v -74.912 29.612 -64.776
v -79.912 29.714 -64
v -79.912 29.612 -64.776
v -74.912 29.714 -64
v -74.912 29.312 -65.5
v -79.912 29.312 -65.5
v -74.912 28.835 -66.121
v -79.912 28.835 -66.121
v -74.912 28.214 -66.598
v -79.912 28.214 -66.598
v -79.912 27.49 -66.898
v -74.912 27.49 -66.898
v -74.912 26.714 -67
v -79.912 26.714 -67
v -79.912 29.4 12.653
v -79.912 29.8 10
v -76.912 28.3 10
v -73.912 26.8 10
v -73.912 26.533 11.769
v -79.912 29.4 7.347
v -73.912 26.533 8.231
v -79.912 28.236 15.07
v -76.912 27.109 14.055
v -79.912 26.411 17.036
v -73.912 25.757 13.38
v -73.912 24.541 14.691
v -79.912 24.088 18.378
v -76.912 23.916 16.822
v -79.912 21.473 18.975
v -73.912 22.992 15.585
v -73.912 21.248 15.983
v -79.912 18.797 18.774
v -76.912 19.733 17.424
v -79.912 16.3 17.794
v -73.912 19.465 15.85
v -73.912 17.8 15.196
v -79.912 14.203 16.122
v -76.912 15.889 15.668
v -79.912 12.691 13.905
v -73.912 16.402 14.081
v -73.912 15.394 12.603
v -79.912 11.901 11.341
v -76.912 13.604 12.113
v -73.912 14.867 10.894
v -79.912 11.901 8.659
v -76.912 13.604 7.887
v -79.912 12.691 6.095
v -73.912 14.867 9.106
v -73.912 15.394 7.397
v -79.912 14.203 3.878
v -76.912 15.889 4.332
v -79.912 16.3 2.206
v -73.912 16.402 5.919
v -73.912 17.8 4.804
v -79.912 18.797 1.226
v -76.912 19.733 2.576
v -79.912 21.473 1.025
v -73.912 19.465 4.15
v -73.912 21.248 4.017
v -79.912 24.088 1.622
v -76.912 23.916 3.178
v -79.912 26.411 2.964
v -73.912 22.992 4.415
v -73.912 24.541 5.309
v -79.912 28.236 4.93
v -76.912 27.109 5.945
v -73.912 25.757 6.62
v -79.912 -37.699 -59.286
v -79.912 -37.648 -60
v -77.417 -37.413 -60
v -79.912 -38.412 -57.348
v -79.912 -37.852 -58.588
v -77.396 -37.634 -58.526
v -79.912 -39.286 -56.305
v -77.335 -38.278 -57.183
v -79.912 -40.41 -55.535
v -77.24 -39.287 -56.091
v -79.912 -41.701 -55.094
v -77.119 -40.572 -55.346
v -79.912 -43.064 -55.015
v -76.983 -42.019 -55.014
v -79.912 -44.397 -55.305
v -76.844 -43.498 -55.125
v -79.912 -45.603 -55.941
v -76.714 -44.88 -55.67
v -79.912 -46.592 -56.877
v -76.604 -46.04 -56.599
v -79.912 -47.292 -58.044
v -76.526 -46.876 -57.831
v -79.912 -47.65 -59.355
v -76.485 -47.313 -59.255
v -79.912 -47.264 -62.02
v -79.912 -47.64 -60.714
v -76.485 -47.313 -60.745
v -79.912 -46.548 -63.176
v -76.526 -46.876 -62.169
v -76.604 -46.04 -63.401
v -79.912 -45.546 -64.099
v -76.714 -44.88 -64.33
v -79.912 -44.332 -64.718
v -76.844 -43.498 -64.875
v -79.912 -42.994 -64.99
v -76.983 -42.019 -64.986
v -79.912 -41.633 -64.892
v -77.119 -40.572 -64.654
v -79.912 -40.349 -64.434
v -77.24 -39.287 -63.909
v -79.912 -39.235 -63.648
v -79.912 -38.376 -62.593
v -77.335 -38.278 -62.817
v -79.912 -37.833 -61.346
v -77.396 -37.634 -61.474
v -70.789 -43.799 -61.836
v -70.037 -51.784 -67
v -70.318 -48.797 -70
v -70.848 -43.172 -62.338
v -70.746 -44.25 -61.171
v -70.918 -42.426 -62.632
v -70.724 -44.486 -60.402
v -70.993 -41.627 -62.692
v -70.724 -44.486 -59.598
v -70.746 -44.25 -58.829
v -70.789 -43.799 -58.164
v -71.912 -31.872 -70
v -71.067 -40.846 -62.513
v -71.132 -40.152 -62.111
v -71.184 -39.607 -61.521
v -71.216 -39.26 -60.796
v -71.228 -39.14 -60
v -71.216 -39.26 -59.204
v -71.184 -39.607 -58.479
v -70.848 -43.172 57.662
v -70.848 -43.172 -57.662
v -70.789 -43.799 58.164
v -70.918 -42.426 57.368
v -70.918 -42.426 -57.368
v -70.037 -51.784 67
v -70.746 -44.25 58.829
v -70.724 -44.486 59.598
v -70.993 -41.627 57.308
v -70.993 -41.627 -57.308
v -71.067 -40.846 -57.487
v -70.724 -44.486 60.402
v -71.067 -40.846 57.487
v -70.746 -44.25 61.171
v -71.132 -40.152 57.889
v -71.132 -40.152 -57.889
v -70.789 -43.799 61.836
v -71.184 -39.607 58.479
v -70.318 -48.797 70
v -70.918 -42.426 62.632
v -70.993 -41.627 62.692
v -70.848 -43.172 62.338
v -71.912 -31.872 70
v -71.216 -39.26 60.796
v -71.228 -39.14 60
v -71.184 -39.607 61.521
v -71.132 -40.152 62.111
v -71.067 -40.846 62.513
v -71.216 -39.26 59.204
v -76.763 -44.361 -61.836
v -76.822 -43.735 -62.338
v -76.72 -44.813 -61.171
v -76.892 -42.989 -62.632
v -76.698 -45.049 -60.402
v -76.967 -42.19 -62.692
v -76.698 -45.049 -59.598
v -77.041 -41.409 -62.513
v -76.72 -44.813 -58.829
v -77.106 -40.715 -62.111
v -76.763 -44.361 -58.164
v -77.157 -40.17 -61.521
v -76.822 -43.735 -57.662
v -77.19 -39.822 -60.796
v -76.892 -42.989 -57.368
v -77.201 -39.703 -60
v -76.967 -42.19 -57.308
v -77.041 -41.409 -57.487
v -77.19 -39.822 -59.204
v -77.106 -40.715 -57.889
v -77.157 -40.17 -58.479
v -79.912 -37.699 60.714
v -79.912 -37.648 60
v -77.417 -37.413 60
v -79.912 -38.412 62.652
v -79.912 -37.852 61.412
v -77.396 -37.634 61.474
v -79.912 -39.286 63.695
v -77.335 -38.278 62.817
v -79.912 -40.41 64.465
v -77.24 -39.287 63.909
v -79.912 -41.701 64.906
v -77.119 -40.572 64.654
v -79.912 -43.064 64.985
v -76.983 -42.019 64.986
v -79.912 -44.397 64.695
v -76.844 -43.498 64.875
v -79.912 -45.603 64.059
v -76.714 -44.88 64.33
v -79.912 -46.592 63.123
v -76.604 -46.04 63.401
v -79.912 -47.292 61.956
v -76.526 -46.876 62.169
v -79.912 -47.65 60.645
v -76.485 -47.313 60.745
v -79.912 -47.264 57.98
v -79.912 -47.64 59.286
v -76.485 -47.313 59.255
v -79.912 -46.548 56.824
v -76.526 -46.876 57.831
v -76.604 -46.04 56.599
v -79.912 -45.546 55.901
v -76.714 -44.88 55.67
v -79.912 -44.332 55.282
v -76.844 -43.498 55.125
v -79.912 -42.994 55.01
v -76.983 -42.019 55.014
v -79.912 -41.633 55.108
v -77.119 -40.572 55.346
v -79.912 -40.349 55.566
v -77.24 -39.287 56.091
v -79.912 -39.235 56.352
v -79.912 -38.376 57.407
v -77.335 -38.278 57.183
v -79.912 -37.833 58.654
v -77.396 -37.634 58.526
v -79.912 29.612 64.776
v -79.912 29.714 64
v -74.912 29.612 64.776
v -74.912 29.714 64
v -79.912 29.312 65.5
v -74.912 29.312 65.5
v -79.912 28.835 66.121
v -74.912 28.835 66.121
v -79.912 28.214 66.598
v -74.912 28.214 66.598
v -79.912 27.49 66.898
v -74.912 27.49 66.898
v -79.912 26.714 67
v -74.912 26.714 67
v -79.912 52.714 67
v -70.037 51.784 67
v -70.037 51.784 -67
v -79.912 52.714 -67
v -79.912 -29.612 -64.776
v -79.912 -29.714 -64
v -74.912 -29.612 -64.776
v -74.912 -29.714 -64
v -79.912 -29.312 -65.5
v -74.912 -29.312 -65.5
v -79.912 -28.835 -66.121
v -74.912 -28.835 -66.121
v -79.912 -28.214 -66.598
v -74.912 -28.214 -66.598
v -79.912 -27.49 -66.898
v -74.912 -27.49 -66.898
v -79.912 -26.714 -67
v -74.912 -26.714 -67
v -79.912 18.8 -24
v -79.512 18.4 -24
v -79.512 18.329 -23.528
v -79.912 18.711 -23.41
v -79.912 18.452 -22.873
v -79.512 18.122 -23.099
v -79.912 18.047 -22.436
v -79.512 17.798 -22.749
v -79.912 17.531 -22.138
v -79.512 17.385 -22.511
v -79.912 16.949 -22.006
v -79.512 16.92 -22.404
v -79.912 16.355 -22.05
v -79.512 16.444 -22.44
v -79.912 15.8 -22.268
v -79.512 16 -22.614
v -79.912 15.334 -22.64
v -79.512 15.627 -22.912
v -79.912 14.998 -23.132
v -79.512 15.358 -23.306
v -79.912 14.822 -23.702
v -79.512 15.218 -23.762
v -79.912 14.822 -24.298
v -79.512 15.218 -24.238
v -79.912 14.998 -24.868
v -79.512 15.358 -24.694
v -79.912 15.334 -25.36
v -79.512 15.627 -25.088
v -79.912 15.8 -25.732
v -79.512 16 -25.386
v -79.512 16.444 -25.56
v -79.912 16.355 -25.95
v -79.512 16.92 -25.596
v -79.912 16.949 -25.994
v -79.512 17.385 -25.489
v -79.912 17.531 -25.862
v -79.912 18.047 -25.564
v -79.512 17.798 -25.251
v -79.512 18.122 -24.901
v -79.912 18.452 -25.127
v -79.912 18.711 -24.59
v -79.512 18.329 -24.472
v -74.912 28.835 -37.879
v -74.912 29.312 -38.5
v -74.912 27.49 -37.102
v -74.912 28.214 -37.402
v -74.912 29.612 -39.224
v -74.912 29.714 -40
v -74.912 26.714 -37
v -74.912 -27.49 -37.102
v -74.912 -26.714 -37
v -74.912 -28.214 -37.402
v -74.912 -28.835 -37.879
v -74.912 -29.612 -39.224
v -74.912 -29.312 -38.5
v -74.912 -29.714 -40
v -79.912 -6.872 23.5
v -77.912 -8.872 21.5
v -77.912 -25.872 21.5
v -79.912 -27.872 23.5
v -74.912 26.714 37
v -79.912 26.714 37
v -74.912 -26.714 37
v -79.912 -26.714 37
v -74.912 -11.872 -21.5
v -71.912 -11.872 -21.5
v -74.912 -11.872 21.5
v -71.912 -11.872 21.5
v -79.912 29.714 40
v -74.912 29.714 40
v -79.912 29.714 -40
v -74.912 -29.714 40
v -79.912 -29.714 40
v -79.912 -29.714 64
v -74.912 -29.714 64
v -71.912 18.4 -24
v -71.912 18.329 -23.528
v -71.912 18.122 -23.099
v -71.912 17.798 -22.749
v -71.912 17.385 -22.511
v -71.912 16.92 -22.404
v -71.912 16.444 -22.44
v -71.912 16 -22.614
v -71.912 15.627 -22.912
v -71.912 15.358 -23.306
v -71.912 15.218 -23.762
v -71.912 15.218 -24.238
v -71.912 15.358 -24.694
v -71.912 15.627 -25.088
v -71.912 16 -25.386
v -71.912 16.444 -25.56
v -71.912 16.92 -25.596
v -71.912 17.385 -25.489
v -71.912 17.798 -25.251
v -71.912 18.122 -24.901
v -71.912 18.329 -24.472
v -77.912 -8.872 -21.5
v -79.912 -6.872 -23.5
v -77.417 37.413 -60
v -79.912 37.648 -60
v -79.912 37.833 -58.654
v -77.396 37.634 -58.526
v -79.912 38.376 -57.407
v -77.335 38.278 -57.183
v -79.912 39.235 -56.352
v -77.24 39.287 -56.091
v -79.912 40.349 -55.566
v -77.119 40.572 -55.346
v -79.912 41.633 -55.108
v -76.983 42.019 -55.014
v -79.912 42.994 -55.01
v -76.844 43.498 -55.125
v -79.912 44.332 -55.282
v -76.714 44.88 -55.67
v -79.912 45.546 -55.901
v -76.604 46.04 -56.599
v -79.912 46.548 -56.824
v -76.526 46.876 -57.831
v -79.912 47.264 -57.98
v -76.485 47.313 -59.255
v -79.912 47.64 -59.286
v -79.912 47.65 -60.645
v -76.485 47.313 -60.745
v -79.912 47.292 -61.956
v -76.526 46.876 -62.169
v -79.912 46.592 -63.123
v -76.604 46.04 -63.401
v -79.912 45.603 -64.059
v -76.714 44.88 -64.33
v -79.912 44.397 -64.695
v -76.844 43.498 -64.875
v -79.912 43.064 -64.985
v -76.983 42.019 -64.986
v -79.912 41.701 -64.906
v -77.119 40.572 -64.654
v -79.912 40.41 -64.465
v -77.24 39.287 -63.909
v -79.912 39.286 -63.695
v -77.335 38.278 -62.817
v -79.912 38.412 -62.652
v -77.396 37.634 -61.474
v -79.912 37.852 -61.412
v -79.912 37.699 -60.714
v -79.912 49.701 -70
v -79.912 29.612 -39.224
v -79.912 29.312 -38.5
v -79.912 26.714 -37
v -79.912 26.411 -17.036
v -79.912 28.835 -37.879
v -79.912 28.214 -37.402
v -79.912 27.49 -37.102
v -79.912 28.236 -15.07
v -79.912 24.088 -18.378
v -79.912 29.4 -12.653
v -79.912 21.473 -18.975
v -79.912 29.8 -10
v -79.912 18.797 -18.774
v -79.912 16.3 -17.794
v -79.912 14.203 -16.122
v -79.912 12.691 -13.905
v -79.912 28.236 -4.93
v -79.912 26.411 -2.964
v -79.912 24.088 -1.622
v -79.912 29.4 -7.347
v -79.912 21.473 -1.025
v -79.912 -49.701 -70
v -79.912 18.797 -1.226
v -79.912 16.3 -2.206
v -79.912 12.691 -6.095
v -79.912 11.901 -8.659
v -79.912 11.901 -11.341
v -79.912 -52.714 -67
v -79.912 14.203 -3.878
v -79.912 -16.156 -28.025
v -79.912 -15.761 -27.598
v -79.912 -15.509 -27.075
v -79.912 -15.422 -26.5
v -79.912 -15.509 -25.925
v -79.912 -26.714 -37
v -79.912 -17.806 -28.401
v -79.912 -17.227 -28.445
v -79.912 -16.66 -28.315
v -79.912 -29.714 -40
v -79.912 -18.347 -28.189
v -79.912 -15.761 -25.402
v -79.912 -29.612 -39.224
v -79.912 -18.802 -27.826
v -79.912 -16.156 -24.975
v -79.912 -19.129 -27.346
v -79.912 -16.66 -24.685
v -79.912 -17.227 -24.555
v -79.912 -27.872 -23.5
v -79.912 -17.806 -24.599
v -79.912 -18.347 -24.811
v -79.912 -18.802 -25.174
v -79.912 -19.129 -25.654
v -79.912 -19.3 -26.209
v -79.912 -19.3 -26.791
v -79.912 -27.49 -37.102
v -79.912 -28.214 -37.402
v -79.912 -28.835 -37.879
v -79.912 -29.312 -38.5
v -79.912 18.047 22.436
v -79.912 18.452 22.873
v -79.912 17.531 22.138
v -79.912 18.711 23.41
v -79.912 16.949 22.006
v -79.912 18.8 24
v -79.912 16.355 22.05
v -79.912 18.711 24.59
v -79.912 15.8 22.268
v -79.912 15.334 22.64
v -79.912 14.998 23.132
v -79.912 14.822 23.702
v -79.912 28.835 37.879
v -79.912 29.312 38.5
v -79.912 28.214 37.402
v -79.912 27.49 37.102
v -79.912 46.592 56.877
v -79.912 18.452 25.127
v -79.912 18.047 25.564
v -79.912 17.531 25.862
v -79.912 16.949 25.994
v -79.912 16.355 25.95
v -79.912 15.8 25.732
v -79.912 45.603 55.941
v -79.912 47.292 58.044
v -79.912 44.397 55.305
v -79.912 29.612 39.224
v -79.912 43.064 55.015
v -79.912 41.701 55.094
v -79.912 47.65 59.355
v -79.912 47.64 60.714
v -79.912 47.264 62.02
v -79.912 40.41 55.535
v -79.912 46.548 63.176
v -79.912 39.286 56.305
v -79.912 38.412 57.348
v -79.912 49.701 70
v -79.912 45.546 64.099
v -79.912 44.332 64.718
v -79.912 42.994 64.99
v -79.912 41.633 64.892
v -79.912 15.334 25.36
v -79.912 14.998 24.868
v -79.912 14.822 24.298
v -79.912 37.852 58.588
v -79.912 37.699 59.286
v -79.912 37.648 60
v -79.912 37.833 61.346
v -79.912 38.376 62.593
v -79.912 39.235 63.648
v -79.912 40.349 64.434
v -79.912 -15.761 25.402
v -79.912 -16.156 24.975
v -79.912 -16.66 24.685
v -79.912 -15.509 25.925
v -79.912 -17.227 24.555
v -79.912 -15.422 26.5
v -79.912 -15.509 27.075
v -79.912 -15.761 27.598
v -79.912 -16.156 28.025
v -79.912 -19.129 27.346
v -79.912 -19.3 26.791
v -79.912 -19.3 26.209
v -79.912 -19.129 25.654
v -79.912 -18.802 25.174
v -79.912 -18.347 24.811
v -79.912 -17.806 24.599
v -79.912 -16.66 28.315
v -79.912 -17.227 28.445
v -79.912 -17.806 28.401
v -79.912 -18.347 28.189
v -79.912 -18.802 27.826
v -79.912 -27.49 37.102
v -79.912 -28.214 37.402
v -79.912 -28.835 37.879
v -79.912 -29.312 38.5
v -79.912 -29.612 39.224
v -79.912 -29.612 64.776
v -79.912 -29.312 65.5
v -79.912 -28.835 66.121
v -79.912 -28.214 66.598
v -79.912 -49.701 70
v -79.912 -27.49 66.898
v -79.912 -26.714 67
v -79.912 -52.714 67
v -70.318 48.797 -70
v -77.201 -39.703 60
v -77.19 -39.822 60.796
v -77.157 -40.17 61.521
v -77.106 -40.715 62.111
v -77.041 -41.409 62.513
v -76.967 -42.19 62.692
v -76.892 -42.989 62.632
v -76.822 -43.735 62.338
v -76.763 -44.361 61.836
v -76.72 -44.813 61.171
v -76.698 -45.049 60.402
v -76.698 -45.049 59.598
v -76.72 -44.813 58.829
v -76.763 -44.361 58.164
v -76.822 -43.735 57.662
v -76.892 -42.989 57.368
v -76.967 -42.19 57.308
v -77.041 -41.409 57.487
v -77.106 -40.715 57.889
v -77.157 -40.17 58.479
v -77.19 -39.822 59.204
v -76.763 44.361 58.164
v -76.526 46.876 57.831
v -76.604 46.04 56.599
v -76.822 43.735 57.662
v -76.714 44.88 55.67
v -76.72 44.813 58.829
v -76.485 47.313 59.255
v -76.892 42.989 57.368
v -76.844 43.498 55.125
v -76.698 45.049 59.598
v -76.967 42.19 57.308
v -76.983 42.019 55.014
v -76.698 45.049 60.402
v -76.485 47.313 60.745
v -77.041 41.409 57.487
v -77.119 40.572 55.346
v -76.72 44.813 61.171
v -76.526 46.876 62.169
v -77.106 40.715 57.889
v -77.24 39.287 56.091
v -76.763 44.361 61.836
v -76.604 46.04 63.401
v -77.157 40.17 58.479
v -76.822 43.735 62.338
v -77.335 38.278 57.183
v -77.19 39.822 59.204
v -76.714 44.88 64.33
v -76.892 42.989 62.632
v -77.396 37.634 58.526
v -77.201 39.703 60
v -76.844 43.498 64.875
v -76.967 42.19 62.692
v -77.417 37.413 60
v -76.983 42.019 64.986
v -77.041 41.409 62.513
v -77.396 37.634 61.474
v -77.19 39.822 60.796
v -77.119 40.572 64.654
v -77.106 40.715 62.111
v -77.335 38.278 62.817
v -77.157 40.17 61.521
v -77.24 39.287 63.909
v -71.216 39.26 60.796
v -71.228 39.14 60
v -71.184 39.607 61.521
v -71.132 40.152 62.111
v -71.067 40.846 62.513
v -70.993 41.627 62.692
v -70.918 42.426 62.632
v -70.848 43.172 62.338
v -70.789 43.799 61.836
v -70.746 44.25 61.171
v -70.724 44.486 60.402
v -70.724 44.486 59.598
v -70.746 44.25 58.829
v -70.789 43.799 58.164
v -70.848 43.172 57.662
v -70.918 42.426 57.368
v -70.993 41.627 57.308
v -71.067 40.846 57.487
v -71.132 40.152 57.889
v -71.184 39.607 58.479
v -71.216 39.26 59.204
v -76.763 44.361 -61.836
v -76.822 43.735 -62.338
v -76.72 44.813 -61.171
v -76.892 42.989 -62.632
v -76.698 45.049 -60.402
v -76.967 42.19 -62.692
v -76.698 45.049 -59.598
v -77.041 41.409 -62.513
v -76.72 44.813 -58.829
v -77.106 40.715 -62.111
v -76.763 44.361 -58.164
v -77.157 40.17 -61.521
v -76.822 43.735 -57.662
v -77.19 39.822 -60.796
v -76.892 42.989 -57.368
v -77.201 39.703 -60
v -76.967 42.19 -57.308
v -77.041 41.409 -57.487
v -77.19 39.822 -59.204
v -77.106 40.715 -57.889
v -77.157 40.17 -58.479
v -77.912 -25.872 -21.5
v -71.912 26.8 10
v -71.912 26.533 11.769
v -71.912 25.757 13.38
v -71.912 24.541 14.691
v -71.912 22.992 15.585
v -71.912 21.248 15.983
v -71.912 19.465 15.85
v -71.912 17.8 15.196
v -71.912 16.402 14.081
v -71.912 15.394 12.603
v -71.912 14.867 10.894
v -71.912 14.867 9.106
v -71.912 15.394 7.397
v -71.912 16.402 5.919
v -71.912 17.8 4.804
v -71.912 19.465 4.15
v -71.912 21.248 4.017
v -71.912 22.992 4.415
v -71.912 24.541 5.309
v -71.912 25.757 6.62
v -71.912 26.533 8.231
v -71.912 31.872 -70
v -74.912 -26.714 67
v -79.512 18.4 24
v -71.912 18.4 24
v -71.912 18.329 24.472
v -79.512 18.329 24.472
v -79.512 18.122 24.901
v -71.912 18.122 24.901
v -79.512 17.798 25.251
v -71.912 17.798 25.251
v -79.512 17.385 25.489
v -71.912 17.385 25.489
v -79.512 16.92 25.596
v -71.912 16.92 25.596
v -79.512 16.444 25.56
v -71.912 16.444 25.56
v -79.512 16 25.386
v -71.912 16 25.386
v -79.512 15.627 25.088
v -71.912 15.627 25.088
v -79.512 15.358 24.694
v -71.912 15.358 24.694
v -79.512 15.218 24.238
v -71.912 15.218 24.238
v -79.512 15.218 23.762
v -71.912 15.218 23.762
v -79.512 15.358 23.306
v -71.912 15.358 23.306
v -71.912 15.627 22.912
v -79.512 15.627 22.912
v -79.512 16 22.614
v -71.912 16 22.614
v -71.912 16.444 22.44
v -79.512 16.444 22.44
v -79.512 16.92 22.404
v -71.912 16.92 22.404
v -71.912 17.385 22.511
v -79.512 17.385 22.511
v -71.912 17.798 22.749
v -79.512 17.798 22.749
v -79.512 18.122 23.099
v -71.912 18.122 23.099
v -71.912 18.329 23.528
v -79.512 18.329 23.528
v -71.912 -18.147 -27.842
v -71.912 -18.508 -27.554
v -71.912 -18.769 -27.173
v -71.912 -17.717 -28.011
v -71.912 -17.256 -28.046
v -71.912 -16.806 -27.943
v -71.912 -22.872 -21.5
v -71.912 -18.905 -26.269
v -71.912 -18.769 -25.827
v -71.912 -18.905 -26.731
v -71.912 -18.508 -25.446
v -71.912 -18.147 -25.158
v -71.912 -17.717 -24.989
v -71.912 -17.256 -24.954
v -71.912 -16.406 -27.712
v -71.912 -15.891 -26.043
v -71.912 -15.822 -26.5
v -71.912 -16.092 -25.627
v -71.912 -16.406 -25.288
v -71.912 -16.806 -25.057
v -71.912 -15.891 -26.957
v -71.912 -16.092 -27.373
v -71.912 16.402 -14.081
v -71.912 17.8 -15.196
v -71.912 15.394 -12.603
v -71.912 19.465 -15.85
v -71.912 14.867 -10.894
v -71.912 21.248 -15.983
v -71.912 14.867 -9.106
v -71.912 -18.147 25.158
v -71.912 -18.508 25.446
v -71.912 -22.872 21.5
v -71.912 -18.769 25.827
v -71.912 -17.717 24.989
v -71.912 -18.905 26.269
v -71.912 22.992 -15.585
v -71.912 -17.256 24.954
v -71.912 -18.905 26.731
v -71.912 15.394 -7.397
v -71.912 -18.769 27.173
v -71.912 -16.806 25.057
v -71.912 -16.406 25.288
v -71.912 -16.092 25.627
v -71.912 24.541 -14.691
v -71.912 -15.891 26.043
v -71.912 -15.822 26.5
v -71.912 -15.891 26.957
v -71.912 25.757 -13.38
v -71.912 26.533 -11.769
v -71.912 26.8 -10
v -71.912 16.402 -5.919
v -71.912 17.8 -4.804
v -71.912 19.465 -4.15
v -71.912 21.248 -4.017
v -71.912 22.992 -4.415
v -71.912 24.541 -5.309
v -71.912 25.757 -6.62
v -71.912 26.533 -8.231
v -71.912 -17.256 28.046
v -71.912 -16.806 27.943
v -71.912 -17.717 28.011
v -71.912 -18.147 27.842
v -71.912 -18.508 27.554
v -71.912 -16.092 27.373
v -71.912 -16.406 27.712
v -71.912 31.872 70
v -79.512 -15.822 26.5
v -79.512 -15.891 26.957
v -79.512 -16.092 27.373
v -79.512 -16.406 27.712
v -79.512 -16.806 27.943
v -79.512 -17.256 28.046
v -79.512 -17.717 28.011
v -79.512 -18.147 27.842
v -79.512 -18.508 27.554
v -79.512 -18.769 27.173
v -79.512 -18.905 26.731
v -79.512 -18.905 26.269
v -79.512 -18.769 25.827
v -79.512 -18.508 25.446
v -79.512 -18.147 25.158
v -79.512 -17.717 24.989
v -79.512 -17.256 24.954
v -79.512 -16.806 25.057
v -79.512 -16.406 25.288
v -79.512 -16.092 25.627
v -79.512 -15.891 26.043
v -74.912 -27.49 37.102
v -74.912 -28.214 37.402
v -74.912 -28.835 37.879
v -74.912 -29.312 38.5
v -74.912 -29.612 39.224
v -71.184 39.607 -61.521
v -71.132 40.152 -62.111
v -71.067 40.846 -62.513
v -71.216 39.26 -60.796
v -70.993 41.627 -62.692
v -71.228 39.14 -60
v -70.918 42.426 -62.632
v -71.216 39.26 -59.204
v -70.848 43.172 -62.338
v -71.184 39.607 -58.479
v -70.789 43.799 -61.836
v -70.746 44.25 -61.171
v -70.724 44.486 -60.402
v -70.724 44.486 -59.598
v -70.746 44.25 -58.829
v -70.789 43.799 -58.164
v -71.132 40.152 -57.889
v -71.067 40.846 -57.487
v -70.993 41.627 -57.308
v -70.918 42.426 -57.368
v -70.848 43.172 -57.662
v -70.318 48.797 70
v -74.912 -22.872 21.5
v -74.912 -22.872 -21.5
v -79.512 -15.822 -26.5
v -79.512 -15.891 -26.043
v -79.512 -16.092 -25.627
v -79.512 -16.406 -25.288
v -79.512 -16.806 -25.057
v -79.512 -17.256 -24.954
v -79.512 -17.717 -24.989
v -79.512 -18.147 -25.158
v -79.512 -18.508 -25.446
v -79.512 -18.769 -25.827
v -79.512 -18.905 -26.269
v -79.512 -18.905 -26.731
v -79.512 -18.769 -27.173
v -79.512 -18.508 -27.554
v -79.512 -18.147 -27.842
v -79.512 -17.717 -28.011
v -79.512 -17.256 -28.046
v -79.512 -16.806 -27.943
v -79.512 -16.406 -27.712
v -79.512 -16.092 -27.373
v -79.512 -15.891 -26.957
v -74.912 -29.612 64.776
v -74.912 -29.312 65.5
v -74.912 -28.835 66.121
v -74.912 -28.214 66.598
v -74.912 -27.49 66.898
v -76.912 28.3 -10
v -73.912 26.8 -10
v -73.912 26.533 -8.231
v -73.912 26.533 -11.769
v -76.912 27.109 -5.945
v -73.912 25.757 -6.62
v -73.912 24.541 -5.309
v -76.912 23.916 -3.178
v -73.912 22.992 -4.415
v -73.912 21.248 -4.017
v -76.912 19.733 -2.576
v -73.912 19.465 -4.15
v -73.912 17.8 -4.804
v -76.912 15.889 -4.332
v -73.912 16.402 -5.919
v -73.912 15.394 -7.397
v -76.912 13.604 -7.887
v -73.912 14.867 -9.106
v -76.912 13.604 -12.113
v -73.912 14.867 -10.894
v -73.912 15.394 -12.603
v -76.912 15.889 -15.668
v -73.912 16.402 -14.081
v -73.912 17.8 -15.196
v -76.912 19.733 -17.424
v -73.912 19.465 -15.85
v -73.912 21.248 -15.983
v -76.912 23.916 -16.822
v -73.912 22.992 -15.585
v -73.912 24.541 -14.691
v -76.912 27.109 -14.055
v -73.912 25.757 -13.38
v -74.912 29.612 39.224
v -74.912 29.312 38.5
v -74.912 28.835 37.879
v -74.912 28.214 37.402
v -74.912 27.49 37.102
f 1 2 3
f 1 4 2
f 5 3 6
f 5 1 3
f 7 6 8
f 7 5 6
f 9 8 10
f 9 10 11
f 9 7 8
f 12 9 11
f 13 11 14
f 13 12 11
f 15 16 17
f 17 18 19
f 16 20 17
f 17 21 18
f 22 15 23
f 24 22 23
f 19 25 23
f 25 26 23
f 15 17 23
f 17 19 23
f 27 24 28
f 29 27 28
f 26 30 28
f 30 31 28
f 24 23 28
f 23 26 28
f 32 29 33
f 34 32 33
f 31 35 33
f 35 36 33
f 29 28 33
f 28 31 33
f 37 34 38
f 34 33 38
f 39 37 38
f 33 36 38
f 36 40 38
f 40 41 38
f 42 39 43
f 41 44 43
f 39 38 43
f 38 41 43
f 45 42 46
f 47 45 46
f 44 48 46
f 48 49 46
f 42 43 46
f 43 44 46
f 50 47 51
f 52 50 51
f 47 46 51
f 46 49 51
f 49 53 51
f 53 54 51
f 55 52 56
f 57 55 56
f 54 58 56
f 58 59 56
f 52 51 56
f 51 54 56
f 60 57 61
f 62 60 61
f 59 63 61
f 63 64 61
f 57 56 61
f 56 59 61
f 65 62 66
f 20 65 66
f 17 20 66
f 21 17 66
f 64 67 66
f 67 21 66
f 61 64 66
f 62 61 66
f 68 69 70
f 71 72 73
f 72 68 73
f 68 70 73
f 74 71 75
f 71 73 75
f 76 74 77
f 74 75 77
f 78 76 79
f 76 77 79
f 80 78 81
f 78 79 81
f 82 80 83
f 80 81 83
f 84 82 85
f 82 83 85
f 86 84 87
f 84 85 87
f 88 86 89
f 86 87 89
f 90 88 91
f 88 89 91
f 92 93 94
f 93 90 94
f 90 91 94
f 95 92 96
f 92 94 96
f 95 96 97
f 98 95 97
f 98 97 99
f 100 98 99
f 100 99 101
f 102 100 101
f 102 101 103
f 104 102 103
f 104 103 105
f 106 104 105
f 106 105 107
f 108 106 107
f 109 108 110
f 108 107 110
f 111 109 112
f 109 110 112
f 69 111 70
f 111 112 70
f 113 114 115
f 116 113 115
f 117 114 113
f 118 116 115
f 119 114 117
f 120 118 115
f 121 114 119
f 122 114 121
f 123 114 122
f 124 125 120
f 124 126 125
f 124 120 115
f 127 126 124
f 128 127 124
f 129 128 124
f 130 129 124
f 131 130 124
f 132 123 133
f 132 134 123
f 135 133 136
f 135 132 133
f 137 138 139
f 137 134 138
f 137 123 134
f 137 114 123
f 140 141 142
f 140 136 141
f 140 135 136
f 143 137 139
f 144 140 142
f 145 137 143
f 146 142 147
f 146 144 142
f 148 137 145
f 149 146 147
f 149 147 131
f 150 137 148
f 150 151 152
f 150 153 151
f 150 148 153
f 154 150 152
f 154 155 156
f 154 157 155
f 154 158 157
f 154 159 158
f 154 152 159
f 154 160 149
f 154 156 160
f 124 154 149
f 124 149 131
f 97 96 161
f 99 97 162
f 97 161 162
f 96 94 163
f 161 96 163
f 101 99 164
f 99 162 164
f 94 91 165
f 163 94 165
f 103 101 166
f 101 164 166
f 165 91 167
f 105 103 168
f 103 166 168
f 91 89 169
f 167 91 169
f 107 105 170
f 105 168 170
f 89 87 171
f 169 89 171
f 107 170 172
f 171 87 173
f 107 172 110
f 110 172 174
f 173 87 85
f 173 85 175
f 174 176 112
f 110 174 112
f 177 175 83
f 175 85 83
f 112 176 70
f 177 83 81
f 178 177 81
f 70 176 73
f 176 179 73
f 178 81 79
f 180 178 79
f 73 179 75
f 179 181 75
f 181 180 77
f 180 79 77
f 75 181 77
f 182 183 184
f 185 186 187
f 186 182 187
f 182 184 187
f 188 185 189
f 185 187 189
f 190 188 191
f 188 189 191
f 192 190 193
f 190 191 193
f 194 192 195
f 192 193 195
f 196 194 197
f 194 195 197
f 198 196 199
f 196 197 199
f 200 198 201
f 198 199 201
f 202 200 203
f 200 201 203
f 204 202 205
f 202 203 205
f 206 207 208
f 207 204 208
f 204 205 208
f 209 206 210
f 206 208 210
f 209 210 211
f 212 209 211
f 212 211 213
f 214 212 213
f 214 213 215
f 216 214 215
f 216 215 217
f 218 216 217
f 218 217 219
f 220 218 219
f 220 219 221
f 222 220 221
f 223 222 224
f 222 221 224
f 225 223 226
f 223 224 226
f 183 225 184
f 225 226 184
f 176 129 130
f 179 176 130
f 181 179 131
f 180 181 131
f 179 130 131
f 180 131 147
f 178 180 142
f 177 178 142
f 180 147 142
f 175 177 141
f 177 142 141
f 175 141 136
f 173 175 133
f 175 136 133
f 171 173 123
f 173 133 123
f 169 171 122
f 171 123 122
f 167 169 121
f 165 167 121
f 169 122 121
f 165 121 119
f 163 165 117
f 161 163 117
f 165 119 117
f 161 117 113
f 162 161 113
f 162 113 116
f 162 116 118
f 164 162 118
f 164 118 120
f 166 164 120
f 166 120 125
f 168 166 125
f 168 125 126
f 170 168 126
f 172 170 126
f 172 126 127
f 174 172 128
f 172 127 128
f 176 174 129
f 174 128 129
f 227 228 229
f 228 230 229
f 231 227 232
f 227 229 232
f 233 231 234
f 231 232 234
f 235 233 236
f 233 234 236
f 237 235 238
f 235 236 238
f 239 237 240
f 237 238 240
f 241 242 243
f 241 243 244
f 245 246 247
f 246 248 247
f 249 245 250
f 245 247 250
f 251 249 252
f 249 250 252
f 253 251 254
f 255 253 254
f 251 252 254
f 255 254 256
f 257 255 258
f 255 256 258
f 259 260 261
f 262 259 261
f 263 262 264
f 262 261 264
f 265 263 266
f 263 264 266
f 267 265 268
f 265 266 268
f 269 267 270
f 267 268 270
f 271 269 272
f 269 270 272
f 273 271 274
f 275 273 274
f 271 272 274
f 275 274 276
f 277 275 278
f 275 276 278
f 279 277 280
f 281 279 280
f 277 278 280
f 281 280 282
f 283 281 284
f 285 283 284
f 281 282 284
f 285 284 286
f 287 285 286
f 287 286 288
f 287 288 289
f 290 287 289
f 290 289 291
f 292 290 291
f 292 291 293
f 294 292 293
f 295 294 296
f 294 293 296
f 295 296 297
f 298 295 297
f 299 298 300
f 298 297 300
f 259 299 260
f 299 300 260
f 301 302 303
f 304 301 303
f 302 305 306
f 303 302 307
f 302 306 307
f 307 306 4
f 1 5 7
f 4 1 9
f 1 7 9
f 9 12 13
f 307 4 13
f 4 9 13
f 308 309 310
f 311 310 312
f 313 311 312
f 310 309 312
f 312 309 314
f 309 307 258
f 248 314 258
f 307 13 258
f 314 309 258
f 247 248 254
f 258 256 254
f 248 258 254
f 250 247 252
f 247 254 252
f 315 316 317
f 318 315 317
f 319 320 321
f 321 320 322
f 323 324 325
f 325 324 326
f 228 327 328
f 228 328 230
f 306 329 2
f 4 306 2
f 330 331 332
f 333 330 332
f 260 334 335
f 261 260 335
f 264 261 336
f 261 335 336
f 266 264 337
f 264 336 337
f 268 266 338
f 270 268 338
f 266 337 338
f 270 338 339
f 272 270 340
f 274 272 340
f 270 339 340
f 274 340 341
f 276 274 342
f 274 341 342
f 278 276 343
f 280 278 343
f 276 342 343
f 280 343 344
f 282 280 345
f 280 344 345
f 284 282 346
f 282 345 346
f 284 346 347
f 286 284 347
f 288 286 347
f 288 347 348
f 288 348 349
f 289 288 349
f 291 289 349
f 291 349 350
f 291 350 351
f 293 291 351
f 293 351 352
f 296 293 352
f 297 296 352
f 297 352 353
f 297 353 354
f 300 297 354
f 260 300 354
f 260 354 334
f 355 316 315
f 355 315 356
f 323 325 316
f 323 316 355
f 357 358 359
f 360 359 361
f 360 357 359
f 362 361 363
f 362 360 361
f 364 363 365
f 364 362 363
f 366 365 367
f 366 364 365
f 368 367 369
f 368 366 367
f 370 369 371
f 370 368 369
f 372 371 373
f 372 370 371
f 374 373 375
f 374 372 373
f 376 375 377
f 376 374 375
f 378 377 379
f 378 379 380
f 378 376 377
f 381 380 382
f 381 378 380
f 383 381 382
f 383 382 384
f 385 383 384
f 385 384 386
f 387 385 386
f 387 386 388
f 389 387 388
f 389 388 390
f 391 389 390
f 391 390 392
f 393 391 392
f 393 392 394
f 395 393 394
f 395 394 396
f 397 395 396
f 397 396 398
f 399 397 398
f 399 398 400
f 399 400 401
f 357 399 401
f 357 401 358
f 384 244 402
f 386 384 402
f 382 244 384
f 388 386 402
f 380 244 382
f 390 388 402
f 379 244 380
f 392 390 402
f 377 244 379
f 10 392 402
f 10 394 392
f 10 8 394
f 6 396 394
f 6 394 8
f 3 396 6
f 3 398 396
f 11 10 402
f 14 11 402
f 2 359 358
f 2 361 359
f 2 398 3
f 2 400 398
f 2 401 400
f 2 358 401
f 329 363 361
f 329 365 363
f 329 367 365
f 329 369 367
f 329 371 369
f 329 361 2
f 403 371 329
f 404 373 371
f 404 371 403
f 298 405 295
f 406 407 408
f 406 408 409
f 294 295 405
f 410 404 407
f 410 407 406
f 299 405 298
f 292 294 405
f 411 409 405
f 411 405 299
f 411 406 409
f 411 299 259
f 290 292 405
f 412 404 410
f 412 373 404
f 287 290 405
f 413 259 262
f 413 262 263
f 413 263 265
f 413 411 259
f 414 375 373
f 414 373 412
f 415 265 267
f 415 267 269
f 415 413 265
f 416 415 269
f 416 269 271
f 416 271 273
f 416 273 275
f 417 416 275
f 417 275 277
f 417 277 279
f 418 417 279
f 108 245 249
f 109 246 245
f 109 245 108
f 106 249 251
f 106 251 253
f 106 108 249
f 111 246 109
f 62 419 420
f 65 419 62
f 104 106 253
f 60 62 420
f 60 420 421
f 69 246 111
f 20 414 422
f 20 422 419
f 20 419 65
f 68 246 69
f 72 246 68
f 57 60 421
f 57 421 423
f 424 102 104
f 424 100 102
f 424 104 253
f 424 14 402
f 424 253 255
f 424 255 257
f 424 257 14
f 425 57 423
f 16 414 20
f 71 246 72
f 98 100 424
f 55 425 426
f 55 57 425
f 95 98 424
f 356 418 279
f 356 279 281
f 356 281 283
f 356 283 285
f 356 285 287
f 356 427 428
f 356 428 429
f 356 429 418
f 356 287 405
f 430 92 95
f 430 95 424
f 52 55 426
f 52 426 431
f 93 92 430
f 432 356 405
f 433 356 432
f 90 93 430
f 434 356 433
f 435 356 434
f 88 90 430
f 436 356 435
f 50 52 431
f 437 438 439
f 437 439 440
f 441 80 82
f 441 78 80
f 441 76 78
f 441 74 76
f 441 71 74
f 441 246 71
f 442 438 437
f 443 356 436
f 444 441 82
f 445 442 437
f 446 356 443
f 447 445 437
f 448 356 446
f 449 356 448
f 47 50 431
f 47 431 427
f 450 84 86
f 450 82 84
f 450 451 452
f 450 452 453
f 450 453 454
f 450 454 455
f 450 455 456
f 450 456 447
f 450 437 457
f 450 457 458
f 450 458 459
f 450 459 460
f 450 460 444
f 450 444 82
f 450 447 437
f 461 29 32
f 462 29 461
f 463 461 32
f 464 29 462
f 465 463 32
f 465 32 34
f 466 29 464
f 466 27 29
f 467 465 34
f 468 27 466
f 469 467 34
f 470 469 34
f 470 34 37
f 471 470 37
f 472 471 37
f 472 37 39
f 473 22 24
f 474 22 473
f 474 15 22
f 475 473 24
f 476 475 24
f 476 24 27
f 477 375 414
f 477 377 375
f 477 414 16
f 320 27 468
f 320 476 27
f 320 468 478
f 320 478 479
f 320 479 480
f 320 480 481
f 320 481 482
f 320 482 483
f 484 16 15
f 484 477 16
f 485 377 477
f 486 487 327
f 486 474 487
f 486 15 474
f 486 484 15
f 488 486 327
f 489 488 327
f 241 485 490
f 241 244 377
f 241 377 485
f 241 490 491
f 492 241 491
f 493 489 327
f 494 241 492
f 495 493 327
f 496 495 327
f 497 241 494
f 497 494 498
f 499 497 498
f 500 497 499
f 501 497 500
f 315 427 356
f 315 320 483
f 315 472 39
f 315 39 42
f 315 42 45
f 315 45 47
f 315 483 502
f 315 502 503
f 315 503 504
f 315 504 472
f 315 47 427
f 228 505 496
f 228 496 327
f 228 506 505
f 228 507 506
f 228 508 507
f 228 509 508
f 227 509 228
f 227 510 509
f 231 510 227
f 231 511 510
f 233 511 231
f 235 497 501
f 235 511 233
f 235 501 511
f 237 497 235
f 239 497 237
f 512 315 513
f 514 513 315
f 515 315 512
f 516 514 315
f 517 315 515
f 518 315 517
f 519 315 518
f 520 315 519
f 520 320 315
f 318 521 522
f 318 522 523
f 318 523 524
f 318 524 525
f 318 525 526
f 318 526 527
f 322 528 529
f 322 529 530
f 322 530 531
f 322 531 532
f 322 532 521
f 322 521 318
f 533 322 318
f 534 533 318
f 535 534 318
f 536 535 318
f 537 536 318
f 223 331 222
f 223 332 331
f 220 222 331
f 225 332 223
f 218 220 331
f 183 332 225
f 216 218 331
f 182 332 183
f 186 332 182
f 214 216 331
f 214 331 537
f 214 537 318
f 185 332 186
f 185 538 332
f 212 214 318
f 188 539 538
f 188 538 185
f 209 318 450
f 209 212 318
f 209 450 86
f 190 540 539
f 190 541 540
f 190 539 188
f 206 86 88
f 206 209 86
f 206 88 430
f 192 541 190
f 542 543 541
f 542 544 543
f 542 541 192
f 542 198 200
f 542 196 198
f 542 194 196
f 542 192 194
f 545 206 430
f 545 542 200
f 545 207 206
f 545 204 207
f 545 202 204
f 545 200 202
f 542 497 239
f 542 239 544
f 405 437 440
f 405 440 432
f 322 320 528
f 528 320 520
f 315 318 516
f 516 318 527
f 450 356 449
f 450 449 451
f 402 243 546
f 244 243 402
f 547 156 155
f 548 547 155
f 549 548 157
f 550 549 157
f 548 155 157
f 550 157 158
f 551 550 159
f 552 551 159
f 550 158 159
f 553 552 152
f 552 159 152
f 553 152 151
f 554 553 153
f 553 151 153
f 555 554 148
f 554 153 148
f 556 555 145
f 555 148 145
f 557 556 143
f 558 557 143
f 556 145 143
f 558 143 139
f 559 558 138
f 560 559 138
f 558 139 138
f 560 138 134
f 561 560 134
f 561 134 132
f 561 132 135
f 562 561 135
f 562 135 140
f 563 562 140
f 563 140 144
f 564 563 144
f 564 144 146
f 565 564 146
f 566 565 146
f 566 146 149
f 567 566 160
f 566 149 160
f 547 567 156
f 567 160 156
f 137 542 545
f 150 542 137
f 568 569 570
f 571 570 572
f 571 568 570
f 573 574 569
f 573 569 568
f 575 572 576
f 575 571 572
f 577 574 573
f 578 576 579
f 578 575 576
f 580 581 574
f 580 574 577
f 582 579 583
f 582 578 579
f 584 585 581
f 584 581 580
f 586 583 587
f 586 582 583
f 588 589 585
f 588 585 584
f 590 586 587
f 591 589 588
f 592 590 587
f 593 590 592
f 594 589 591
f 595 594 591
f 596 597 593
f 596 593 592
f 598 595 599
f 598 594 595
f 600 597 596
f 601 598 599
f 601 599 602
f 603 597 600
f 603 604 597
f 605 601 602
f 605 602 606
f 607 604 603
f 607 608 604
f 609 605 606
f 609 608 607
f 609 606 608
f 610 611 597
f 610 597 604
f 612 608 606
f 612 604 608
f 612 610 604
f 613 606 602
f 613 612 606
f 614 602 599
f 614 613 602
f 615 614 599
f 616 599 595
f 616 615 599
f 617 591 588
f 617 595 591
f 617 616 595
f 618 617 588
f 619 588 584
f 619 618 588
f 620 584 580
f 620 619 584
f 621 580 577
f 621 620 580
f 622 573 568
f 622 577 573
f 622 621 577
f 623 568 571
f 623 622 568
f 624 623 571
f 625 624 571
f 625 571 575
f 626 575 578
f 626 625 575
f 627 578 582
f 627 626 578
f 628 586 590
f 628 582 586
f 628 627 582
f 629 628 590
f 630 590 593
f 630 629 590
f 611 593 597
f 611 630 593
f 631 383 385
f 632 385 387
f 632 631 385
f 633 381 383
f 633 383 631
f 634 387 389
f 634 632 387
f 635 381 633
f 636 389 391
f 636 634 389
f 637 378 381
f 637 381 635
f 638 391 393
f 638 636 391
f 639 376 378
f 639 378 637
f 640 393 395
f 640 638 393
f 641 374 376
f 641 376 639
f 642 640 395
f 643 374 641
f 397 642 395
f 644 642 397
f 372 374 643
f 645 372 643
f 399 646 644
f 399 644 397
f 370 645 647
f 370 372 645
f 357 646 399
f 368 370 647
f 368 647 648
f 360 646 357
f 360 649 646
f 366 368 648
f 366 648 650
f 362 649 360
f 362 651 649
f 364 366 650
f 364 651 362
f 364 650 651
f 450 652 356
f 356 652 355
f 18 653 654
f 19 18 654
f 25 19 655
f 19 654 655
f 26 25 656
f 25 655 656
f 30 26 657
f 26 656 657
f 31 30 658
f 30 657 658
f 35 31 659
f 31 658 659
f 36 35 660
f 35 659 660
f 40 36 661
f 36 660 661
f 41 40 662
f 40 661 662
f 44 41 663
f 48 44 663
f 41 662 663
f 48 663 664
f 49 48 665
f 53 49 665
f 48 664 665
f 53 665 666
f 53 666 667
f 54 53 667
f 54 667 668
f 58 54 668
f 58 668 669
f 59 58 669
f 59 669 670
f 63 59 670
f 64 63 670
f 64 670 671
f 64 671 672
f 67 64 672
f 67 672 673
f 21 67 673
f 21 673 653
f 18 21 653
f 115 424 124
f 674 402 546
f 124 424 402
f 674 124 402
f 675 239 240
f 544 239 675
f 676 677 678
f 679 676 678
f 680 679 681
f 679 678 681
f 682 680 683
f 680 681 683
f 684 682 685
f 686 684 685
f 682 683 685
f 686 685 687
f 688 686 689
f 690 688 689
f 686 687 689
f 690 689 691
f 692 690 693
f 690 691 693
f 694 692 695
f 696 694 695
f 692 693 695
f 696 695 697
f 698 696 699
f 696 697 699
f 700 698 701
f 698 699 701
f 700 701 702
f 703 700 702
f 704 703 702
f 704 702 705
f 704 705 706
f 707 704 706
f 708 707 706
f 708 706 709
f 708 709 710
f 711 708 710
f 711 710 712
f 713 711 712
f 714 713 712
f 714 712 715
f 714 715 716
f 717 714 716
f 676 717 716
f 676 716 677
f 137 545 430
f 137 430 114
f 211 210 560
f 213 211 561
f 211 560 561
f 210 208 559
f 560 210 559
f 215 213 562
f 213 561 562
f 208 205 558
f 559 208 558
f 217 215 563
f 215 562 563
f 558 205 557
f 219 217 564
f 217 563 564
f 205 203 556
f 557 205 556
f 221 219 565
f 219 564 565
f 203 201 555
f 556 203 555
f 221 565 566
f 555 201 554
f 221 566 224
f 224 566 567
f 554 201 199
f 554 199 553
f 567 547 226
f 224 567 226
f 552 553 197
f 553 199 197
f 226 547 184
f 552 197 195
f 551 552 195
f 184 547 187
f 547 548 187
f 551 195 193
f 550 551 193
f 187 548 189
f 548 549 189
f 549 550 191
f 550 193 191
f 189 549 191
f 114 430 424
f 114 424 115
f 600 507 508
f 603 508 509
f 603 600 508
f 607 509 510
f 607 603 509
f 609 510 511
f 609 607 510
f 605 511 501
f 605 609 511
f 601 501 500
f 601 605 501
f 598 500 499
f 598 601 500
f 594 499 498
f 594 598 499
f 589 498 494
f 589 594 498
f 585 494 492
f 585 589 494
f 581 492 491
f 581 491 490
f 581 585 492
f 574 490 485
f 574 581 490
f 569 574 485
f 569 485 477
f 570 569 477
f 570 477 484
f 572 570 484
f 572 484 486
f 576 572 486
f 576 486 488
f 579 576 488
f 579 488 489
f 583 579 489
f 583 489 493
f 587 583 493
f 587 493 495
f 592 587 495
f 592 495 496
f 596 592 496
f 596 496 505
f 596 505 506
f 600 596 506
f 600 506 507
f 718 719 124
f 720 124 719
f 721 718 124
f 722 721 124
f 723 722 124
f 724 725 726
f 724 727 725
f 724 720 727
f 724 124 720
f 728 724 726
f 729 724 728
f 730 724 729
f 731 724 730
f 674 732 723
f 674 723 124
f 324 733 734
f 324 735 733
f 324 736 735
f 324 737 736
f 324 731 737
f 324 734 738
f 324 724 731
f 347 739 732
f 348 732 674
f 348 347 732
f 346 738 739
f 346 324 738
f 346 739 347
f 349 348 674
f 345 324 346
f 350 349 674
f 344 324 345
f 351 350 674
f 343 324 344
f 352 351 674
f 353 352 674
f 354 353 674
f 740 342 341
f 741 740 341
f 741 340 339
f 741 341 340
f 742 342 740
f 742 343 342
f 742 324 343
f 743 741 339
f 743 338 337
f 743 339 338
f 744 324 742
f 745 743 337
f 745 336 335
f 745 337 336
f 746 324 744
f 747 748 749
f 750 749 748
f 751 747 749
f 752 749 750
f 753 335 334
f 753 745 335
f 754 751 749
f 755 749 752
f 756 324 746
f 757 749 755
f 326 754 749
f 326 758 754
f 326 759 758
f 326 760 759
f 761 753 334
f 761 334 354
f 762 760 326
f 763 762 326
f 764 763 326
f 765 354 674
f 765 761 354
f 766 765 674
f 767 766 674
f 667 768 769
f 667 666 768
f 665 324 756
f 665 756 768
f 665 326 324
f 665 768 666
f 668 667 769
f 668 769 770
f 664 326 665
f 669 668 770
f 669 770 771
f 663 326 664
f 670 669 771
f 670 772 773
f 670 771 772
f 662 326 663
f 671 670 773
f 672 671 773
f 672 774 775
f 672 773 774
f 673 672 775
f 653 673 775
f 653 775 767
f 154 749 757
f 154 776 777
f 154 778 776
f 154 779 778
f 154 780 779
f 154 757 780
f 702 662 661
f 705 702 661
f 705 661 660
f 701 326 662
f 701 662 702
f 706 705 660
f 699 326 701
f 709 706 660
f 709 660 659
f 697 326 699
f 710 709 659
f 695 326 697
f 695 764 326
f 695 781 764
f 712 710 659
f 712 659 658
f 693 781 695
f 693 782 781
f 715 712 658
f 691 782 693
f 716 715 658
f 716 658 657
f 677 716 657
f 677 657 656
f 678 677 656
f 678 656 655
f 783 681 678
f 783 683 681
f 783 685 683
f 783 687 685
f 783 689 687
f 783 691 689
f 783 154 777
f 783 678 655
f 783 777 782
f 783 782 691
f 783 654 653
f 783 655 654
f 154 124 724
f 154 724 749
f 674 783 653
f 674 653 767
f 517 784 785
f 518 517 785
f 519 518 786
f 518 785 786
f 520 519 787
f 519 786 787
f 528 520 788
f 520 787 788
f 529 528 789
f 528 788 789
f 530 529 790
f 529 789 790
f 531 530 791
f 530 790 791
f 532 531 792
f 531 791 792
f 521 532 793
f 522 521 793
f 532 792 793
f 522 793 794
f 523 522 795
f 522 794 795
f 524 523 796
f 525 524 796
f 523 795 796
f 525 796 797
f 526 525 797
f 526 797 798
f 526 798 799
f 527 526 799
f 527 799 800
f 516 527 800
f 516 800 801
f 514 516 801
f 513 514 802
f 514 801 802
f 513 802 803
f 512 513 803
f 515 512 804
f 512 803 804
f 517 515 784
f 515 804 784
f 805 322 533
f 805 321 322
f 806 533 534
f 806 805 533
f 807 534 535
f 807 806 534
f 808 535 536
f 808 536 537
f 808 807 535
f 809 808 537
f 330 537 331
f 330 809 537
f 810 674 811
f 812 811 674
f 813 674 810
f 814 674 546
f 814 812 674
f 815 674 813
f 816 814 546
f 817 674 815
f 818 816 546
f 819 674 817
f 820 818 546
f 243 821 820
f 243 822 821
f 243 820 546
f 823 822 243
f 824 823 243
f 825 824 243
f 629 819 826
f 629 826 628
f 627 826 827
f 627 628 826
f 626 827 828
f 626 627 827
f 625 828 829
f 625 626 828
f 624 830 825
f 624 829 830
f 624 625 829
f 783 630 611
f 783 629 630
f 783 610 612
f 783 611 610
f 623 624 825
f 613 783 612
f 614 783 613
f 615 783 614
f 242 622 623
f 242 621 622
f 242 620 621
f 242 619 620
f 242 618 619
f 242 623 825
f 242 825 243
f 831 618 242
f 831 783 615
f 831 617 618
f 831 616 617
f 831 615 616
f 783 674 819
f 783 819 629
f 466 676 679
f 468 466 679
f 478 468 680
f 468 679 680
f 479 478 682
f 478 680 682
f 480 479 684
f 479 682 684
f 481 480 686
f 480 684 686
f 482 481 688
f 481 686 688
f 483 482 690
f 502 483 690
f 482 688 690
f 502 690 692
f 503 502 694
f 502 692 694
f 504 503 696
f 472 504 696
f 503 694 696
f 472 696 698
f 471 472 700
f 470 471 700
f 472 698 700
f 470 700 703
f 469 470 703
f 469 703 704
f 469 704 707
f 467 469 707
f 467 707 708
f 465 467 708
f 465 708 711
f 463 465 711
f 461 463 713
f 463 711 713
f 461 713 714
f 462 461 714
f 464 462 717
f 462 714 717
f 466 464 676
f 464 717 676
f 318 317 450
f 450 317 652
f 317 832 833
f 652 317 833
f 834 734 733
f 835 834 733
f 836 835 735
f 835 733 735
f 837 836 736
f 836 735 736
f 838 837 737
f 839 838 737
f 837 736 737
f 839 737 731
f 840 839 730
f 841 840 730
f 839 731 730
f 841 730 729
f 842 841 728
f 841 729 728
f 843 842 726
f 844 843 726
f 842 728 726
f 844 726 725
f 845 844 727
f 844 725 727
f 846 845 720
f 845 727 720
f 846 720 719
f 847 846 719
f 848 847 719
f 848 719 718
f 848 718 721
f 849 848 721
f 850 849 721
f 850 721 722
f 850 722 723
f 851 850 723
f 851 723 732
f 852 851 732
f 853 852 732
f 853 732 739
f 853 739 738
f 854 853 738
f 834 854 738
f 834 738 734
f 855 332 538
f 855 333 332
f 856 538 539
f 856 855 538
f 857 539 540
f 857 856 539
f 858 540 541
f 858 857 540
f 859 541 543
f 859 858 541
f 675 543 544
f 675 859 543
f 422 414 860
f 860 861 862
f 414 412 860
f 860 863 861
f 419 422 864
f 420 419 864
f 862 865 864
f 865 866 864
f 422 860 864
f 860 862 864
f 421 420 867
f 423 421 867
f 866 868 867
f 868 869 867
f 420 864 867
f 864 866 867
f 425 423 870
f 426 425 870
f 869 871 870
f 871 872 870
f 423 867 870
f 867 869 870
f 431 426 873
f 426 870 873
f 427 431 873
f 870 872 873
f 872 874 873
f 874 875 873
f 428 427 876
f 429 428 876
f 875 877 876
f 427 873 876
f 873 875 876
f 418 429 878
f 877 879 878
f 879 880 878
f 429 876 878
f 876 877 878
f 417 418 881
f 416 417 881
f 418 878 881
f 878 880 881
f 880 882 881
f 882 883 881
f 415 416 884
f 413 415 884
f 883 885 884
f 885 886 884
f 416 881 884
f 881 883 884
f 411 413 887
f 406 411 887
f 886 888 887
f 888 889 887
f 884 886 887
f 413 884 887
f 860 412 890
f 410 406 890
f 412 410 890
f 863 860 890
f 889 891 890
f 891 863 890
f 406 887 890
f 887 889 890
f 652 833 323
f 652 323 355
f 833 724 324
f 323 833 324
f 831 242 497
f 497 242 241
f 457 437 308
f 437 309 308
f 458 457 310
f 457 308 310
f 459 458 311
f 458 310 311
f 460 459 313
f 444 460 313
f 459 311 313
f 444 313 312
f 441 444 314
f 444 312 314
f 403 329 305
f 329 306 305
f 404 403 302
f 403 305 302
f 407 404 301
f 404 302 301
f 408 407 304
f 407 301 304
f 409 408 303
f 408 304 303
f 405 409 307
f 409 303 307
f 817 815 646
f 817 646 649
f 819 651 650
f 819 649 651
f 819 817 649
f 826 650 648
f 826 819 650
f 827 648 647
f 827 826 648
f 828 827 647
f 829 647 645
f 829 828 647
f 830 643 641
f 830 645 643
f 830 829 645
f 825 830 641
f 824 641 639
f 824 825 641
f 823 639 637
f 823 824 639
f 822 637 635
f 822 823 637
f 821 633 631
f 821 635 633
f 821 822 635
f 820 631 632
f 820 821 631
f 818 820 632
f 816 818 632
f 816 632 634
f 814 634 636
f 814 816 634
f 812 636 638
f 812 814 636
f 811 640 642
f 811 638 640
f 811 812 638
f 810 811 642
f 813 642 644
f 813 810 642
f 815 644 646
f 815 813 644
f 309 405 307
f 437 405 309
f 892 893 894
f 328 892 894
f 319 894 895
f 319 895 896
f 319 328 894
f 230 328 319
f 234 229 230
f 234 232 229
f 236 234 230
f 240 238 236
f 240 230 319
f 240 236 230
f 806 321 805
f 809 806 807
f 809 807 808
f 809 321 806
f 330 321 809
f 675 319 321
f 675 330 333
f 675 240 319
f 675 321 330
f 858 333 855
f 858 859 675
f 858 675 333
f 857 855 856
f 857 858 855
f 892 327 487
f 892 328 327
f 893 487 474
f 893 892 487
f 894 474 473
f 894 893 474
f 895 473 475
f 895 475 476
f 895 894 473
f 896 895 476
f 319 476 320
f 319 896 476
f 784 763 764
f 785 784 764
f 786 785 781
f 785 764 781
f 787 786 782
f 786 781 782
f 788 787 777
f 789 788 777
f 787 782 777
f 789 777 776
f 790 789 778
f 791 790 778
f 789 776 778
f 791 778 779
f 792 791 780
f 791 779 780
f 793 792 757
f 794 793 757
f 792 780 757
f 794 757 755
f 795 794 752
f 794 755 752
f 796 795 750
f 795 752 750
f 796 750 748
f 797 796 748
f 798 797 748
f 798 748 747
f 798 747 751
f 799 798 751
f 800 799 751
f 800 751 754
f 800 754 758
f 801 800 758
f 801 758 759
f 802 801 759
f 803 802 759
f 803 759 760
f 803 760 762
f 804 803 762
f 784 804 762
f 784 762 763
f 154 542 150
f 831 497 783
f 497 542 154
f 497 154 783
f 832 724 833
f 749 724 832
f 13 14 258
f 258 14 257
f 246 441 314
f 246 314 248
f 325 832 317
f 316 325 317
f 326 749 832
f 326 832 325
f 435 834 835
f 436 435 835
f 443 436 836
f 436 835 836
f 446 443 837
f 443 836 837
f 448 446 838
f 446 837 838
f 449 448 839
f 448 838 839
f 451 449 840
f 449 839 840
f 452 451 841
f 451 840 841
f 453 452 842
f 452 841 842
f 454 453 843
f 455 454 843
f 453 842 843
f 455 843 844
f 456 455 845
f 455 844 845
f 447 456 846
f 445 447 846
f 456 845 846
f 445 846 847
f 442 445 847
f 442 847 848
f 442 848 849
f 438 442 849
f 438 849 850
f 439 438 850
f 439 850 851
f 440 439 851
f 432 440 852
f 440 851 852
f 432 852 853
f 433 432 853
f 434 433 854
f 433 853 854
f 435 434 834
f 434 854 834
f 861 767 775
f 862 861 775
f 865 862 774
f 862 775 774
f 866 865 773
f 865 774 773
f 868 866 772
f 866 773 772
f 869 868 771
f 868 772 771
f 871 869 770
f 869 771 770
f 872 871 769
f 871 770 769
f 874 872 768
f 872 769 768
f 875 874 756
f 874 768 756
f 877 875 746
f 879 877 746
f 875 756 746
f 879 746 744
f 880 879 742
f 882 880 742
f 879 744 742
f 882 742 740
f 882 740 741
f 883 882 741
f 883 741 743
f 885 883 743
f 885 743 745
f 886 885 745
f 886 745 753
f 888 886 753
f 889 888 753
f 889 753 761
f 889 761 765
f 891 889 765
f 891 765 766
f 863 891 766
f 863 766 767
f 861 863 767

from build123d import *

# Parameters (mm, degrees)
SKETCH021_W      = 59.427886
SKETCH021_H      = 30
PAD012_DEPTH     = 5
FILLET003_R      = 3
PAD011_DEPTH     = 70
SKETCH017_R      = 2.7
POCKET006_DEPTH  = 12
SKETCH018_R      = 5
POCKET007_DEPTH  = 5
CHAMFER008_SIZE  = 3
SKETCH019_R      = 1.55
SKETCH019_W      = 11
SKETCH019_H      = 43
POCKET008_DEPTH  = 20
CHAMFER009_SIZE  = 5
CHAMFER010_SIZE  = 2
SKETCH020_R      = 1.6
SKETCH020_R_2    = 6
POCKET009_DEPTH  = 14
CHAMFER011_SIZE2 = 6
CHAMFER011_SIZE  = 3
CHAMFER012_SIZE  = 0.4


with BuildPart() as rear_carter_center:
    # Sketch021 (on Face1 of CopyChamfer012) → Pad012 (new body)
    with BuildSketch(Plane(origin=(-79.911931, 0, 0), x_dir=(0, -1, 0), z_dir=(-1, 0, 0))):
        with Locations((0, 52)):
            Rectangle(SKETCH021_W, SKETCH021_H)
    extrude(amount=-PAD012_DEPTH)

    # Mirrored007: rear-carter-center across XY


with BuildPart() as rear_carter_center_1:
    add(rear_carter_center.part)
    add(rear_carter_center.part.mirror(Plane.XY))

    # Fillet003
    fillet003_edges = [rear_carter_center_1.edges().sort_by_distance(p)[0] for p in [
        (-77.411931, -29.713943, 67),
        (-77.411931, -29.713943, 37),
        (-77.411931, 29.713943, 67),
        (-77.411931, 29.713943, -37),
        (-77.411931, -29.713943, -37),
        (-77.411931, 29.713943, 37),
        (-77.411931, 29.713943, -67),
        (-77.411931, -29.713943, -67),
    ]]
    fillet(fillet003_edges, radius=FILLET003_R)


with BuildPart() as cut:
    # Sketch016 (on XY_Plane010 of Origin020) → Pad011 (new body, symmetric)
    with BuildSketch(Plane.XY):
        Polygon((-70.037094, -51.784164), (-71.911931, -31.872233), (-71.911931, 31.872233), (-70.037094, 51.784164), (-79.911931, 52.713943), (-79.911931, -52.713943), align=None)
    extrude(amount=PAD011_DEPTH, both=True)

    # Sketch017 (on Face1 of Pad011) → Pocket006 (cut)
    with BuildSketch(Plane(origin=(-74.254608, -6.991552, 0), x_dir=(-0.093742, 0.995597, 0), z_dir=(0.995597, 0.093742, 0))):
        with Locations((-34.990726, 60)):
            Circle(SKETCH017_R)
        with Locations((-34.990726, -60)):
            Circle(SKETCH017_R)
    pocket006 = extrude(amount=-POCKET006_DEPTH, mode=Mode.SUBTRACT)

    # Sketch018 (on Face1 of Pocket006) → Pocket007 (cut)
    with BuildSketch(Plane(origin=(-80.228187, -7.554003, 0), x_dir=(-0.093742, 0.995597, 0), z_dir=(0.995597, 0.093742, 0))):
        with Locations((-34.990726, 60)):
            Circle(SKETCH018_R)
        with Locations((-34.990726, -60)):
            Circle(SKETCH018_R)
    pocket007 = extrude(amount=-POCKET007_DEPTH, mode=Mode.SUBTRACT)

    # Mirrored006: Pocket006, Pocket007 across XZ
    add(pocket006.mirror(Plane.XZ), mode=Mode.SUBTRACT)
    add(pocket007.mirror(Plane.XZ), mode=Mode.SUBTRACT)

    # Chamfer008
    chamfer008_edges = [cut.edges().sort_by_distance(p)[0] for p in [
        (-74.974512, 52.249054, 70),
        (-74.974512, 52.249054, -70),
        (-74.974512, -52.249054, 70),
        (-74.974512, -52.249054, -70),
    ]]
    chamfer(chamfer008_edges, length=CHAMFER008_SIZE)

    # Sketch019 (on Face7 of Chamfer008) → Pocket008 (cut)
    with BuildSketch(Plane.YZ.offset(-71.911931)):
        with Locations((-17.372233, 26.5)):
            Circle(SKETCH019_R)
        with Locations((-17.372233, -26.5)):
            Circle(SKETCH019_R)
        with Locations((-17.372233, 0)):
            Rectangle(SKETCH019_W, SKETCH019_H)
    extrude(amount=-POCKET008_DEPTH, mode=Mode.SUBTRACT)

    # Chamfer009
    chamfer009_edges = [cut.edges().sort_by_distance(p)[0] for p in [
        (-79.911931, -11.872233, 0),
        (-79.911931, -22.872233, 0),
    ]]
    chamfer(chamfer009_edges, length=CHAMFER009_SIZE)

    # Chamfer010
    chamfer010_edges = [cut.edges().sort_by_distance(p)[0] for p in [
        (-79.911931, -17.372233, 21.5),
        (-79.911931, -17.372233, -21.5),
    ]]
    chamfer(chamfer010_edges, length=CHAMFER010_SIZE)

    # Sketch020 (on Face24 of Chamfer010) → Pocket009 (cut)
    with BuildSketch(Plane.YZ.offset(-71.911931)):
        with Locations((16.8, 24)):
            Circle(SKETCH020_R)
        with Locations((16.8, -24)):
            Circle(SKETCH020_R)
        with Locations((20.8, 10)):
            Circle(SKETCH020_R_2)
        with Locations((20.8, -10)):
            Circle(SKETCH020_R_2)
    extrude(amount=-POCKET009_DEPTH, mode=Mode.SUBTRACT)

    # Chamfer011
    chamfer011_edges = [cut.edges().sort_by_distance(p)[0] for p in [
        (-79.911931, 14.8, 10),
        (-79.911931, 14.8, -10),
    ]]
    chamfer011_side = cut.faces().sort_by_distance((-79.911931, 0.943229, 0))[0]
    chamfer(chamfer011_edges, length=CHAMFER011_SIZE, length2=CHAMFER011_SIZE2, reference=chamfer011_side)

    # Chamfer012
    chamfer012_edges = [cut.edges().sort_by_distance(p)[0] for p in [
        (-79.911931, 15.2, -24),
        (-79.911931, 15.2, 24),
        (-79.911931, -18.922233, 26.5),
        (-79.911931, -18.922233, -26.5),
    ]]
    chamfer(chamfer012_edges, length=CHAMFER012_SIZE)

    # Cut: cut rear-carter-center
    add(rear_carter_center_1.part, mode=Mode.SUBTRACT)


solid = cut.part
